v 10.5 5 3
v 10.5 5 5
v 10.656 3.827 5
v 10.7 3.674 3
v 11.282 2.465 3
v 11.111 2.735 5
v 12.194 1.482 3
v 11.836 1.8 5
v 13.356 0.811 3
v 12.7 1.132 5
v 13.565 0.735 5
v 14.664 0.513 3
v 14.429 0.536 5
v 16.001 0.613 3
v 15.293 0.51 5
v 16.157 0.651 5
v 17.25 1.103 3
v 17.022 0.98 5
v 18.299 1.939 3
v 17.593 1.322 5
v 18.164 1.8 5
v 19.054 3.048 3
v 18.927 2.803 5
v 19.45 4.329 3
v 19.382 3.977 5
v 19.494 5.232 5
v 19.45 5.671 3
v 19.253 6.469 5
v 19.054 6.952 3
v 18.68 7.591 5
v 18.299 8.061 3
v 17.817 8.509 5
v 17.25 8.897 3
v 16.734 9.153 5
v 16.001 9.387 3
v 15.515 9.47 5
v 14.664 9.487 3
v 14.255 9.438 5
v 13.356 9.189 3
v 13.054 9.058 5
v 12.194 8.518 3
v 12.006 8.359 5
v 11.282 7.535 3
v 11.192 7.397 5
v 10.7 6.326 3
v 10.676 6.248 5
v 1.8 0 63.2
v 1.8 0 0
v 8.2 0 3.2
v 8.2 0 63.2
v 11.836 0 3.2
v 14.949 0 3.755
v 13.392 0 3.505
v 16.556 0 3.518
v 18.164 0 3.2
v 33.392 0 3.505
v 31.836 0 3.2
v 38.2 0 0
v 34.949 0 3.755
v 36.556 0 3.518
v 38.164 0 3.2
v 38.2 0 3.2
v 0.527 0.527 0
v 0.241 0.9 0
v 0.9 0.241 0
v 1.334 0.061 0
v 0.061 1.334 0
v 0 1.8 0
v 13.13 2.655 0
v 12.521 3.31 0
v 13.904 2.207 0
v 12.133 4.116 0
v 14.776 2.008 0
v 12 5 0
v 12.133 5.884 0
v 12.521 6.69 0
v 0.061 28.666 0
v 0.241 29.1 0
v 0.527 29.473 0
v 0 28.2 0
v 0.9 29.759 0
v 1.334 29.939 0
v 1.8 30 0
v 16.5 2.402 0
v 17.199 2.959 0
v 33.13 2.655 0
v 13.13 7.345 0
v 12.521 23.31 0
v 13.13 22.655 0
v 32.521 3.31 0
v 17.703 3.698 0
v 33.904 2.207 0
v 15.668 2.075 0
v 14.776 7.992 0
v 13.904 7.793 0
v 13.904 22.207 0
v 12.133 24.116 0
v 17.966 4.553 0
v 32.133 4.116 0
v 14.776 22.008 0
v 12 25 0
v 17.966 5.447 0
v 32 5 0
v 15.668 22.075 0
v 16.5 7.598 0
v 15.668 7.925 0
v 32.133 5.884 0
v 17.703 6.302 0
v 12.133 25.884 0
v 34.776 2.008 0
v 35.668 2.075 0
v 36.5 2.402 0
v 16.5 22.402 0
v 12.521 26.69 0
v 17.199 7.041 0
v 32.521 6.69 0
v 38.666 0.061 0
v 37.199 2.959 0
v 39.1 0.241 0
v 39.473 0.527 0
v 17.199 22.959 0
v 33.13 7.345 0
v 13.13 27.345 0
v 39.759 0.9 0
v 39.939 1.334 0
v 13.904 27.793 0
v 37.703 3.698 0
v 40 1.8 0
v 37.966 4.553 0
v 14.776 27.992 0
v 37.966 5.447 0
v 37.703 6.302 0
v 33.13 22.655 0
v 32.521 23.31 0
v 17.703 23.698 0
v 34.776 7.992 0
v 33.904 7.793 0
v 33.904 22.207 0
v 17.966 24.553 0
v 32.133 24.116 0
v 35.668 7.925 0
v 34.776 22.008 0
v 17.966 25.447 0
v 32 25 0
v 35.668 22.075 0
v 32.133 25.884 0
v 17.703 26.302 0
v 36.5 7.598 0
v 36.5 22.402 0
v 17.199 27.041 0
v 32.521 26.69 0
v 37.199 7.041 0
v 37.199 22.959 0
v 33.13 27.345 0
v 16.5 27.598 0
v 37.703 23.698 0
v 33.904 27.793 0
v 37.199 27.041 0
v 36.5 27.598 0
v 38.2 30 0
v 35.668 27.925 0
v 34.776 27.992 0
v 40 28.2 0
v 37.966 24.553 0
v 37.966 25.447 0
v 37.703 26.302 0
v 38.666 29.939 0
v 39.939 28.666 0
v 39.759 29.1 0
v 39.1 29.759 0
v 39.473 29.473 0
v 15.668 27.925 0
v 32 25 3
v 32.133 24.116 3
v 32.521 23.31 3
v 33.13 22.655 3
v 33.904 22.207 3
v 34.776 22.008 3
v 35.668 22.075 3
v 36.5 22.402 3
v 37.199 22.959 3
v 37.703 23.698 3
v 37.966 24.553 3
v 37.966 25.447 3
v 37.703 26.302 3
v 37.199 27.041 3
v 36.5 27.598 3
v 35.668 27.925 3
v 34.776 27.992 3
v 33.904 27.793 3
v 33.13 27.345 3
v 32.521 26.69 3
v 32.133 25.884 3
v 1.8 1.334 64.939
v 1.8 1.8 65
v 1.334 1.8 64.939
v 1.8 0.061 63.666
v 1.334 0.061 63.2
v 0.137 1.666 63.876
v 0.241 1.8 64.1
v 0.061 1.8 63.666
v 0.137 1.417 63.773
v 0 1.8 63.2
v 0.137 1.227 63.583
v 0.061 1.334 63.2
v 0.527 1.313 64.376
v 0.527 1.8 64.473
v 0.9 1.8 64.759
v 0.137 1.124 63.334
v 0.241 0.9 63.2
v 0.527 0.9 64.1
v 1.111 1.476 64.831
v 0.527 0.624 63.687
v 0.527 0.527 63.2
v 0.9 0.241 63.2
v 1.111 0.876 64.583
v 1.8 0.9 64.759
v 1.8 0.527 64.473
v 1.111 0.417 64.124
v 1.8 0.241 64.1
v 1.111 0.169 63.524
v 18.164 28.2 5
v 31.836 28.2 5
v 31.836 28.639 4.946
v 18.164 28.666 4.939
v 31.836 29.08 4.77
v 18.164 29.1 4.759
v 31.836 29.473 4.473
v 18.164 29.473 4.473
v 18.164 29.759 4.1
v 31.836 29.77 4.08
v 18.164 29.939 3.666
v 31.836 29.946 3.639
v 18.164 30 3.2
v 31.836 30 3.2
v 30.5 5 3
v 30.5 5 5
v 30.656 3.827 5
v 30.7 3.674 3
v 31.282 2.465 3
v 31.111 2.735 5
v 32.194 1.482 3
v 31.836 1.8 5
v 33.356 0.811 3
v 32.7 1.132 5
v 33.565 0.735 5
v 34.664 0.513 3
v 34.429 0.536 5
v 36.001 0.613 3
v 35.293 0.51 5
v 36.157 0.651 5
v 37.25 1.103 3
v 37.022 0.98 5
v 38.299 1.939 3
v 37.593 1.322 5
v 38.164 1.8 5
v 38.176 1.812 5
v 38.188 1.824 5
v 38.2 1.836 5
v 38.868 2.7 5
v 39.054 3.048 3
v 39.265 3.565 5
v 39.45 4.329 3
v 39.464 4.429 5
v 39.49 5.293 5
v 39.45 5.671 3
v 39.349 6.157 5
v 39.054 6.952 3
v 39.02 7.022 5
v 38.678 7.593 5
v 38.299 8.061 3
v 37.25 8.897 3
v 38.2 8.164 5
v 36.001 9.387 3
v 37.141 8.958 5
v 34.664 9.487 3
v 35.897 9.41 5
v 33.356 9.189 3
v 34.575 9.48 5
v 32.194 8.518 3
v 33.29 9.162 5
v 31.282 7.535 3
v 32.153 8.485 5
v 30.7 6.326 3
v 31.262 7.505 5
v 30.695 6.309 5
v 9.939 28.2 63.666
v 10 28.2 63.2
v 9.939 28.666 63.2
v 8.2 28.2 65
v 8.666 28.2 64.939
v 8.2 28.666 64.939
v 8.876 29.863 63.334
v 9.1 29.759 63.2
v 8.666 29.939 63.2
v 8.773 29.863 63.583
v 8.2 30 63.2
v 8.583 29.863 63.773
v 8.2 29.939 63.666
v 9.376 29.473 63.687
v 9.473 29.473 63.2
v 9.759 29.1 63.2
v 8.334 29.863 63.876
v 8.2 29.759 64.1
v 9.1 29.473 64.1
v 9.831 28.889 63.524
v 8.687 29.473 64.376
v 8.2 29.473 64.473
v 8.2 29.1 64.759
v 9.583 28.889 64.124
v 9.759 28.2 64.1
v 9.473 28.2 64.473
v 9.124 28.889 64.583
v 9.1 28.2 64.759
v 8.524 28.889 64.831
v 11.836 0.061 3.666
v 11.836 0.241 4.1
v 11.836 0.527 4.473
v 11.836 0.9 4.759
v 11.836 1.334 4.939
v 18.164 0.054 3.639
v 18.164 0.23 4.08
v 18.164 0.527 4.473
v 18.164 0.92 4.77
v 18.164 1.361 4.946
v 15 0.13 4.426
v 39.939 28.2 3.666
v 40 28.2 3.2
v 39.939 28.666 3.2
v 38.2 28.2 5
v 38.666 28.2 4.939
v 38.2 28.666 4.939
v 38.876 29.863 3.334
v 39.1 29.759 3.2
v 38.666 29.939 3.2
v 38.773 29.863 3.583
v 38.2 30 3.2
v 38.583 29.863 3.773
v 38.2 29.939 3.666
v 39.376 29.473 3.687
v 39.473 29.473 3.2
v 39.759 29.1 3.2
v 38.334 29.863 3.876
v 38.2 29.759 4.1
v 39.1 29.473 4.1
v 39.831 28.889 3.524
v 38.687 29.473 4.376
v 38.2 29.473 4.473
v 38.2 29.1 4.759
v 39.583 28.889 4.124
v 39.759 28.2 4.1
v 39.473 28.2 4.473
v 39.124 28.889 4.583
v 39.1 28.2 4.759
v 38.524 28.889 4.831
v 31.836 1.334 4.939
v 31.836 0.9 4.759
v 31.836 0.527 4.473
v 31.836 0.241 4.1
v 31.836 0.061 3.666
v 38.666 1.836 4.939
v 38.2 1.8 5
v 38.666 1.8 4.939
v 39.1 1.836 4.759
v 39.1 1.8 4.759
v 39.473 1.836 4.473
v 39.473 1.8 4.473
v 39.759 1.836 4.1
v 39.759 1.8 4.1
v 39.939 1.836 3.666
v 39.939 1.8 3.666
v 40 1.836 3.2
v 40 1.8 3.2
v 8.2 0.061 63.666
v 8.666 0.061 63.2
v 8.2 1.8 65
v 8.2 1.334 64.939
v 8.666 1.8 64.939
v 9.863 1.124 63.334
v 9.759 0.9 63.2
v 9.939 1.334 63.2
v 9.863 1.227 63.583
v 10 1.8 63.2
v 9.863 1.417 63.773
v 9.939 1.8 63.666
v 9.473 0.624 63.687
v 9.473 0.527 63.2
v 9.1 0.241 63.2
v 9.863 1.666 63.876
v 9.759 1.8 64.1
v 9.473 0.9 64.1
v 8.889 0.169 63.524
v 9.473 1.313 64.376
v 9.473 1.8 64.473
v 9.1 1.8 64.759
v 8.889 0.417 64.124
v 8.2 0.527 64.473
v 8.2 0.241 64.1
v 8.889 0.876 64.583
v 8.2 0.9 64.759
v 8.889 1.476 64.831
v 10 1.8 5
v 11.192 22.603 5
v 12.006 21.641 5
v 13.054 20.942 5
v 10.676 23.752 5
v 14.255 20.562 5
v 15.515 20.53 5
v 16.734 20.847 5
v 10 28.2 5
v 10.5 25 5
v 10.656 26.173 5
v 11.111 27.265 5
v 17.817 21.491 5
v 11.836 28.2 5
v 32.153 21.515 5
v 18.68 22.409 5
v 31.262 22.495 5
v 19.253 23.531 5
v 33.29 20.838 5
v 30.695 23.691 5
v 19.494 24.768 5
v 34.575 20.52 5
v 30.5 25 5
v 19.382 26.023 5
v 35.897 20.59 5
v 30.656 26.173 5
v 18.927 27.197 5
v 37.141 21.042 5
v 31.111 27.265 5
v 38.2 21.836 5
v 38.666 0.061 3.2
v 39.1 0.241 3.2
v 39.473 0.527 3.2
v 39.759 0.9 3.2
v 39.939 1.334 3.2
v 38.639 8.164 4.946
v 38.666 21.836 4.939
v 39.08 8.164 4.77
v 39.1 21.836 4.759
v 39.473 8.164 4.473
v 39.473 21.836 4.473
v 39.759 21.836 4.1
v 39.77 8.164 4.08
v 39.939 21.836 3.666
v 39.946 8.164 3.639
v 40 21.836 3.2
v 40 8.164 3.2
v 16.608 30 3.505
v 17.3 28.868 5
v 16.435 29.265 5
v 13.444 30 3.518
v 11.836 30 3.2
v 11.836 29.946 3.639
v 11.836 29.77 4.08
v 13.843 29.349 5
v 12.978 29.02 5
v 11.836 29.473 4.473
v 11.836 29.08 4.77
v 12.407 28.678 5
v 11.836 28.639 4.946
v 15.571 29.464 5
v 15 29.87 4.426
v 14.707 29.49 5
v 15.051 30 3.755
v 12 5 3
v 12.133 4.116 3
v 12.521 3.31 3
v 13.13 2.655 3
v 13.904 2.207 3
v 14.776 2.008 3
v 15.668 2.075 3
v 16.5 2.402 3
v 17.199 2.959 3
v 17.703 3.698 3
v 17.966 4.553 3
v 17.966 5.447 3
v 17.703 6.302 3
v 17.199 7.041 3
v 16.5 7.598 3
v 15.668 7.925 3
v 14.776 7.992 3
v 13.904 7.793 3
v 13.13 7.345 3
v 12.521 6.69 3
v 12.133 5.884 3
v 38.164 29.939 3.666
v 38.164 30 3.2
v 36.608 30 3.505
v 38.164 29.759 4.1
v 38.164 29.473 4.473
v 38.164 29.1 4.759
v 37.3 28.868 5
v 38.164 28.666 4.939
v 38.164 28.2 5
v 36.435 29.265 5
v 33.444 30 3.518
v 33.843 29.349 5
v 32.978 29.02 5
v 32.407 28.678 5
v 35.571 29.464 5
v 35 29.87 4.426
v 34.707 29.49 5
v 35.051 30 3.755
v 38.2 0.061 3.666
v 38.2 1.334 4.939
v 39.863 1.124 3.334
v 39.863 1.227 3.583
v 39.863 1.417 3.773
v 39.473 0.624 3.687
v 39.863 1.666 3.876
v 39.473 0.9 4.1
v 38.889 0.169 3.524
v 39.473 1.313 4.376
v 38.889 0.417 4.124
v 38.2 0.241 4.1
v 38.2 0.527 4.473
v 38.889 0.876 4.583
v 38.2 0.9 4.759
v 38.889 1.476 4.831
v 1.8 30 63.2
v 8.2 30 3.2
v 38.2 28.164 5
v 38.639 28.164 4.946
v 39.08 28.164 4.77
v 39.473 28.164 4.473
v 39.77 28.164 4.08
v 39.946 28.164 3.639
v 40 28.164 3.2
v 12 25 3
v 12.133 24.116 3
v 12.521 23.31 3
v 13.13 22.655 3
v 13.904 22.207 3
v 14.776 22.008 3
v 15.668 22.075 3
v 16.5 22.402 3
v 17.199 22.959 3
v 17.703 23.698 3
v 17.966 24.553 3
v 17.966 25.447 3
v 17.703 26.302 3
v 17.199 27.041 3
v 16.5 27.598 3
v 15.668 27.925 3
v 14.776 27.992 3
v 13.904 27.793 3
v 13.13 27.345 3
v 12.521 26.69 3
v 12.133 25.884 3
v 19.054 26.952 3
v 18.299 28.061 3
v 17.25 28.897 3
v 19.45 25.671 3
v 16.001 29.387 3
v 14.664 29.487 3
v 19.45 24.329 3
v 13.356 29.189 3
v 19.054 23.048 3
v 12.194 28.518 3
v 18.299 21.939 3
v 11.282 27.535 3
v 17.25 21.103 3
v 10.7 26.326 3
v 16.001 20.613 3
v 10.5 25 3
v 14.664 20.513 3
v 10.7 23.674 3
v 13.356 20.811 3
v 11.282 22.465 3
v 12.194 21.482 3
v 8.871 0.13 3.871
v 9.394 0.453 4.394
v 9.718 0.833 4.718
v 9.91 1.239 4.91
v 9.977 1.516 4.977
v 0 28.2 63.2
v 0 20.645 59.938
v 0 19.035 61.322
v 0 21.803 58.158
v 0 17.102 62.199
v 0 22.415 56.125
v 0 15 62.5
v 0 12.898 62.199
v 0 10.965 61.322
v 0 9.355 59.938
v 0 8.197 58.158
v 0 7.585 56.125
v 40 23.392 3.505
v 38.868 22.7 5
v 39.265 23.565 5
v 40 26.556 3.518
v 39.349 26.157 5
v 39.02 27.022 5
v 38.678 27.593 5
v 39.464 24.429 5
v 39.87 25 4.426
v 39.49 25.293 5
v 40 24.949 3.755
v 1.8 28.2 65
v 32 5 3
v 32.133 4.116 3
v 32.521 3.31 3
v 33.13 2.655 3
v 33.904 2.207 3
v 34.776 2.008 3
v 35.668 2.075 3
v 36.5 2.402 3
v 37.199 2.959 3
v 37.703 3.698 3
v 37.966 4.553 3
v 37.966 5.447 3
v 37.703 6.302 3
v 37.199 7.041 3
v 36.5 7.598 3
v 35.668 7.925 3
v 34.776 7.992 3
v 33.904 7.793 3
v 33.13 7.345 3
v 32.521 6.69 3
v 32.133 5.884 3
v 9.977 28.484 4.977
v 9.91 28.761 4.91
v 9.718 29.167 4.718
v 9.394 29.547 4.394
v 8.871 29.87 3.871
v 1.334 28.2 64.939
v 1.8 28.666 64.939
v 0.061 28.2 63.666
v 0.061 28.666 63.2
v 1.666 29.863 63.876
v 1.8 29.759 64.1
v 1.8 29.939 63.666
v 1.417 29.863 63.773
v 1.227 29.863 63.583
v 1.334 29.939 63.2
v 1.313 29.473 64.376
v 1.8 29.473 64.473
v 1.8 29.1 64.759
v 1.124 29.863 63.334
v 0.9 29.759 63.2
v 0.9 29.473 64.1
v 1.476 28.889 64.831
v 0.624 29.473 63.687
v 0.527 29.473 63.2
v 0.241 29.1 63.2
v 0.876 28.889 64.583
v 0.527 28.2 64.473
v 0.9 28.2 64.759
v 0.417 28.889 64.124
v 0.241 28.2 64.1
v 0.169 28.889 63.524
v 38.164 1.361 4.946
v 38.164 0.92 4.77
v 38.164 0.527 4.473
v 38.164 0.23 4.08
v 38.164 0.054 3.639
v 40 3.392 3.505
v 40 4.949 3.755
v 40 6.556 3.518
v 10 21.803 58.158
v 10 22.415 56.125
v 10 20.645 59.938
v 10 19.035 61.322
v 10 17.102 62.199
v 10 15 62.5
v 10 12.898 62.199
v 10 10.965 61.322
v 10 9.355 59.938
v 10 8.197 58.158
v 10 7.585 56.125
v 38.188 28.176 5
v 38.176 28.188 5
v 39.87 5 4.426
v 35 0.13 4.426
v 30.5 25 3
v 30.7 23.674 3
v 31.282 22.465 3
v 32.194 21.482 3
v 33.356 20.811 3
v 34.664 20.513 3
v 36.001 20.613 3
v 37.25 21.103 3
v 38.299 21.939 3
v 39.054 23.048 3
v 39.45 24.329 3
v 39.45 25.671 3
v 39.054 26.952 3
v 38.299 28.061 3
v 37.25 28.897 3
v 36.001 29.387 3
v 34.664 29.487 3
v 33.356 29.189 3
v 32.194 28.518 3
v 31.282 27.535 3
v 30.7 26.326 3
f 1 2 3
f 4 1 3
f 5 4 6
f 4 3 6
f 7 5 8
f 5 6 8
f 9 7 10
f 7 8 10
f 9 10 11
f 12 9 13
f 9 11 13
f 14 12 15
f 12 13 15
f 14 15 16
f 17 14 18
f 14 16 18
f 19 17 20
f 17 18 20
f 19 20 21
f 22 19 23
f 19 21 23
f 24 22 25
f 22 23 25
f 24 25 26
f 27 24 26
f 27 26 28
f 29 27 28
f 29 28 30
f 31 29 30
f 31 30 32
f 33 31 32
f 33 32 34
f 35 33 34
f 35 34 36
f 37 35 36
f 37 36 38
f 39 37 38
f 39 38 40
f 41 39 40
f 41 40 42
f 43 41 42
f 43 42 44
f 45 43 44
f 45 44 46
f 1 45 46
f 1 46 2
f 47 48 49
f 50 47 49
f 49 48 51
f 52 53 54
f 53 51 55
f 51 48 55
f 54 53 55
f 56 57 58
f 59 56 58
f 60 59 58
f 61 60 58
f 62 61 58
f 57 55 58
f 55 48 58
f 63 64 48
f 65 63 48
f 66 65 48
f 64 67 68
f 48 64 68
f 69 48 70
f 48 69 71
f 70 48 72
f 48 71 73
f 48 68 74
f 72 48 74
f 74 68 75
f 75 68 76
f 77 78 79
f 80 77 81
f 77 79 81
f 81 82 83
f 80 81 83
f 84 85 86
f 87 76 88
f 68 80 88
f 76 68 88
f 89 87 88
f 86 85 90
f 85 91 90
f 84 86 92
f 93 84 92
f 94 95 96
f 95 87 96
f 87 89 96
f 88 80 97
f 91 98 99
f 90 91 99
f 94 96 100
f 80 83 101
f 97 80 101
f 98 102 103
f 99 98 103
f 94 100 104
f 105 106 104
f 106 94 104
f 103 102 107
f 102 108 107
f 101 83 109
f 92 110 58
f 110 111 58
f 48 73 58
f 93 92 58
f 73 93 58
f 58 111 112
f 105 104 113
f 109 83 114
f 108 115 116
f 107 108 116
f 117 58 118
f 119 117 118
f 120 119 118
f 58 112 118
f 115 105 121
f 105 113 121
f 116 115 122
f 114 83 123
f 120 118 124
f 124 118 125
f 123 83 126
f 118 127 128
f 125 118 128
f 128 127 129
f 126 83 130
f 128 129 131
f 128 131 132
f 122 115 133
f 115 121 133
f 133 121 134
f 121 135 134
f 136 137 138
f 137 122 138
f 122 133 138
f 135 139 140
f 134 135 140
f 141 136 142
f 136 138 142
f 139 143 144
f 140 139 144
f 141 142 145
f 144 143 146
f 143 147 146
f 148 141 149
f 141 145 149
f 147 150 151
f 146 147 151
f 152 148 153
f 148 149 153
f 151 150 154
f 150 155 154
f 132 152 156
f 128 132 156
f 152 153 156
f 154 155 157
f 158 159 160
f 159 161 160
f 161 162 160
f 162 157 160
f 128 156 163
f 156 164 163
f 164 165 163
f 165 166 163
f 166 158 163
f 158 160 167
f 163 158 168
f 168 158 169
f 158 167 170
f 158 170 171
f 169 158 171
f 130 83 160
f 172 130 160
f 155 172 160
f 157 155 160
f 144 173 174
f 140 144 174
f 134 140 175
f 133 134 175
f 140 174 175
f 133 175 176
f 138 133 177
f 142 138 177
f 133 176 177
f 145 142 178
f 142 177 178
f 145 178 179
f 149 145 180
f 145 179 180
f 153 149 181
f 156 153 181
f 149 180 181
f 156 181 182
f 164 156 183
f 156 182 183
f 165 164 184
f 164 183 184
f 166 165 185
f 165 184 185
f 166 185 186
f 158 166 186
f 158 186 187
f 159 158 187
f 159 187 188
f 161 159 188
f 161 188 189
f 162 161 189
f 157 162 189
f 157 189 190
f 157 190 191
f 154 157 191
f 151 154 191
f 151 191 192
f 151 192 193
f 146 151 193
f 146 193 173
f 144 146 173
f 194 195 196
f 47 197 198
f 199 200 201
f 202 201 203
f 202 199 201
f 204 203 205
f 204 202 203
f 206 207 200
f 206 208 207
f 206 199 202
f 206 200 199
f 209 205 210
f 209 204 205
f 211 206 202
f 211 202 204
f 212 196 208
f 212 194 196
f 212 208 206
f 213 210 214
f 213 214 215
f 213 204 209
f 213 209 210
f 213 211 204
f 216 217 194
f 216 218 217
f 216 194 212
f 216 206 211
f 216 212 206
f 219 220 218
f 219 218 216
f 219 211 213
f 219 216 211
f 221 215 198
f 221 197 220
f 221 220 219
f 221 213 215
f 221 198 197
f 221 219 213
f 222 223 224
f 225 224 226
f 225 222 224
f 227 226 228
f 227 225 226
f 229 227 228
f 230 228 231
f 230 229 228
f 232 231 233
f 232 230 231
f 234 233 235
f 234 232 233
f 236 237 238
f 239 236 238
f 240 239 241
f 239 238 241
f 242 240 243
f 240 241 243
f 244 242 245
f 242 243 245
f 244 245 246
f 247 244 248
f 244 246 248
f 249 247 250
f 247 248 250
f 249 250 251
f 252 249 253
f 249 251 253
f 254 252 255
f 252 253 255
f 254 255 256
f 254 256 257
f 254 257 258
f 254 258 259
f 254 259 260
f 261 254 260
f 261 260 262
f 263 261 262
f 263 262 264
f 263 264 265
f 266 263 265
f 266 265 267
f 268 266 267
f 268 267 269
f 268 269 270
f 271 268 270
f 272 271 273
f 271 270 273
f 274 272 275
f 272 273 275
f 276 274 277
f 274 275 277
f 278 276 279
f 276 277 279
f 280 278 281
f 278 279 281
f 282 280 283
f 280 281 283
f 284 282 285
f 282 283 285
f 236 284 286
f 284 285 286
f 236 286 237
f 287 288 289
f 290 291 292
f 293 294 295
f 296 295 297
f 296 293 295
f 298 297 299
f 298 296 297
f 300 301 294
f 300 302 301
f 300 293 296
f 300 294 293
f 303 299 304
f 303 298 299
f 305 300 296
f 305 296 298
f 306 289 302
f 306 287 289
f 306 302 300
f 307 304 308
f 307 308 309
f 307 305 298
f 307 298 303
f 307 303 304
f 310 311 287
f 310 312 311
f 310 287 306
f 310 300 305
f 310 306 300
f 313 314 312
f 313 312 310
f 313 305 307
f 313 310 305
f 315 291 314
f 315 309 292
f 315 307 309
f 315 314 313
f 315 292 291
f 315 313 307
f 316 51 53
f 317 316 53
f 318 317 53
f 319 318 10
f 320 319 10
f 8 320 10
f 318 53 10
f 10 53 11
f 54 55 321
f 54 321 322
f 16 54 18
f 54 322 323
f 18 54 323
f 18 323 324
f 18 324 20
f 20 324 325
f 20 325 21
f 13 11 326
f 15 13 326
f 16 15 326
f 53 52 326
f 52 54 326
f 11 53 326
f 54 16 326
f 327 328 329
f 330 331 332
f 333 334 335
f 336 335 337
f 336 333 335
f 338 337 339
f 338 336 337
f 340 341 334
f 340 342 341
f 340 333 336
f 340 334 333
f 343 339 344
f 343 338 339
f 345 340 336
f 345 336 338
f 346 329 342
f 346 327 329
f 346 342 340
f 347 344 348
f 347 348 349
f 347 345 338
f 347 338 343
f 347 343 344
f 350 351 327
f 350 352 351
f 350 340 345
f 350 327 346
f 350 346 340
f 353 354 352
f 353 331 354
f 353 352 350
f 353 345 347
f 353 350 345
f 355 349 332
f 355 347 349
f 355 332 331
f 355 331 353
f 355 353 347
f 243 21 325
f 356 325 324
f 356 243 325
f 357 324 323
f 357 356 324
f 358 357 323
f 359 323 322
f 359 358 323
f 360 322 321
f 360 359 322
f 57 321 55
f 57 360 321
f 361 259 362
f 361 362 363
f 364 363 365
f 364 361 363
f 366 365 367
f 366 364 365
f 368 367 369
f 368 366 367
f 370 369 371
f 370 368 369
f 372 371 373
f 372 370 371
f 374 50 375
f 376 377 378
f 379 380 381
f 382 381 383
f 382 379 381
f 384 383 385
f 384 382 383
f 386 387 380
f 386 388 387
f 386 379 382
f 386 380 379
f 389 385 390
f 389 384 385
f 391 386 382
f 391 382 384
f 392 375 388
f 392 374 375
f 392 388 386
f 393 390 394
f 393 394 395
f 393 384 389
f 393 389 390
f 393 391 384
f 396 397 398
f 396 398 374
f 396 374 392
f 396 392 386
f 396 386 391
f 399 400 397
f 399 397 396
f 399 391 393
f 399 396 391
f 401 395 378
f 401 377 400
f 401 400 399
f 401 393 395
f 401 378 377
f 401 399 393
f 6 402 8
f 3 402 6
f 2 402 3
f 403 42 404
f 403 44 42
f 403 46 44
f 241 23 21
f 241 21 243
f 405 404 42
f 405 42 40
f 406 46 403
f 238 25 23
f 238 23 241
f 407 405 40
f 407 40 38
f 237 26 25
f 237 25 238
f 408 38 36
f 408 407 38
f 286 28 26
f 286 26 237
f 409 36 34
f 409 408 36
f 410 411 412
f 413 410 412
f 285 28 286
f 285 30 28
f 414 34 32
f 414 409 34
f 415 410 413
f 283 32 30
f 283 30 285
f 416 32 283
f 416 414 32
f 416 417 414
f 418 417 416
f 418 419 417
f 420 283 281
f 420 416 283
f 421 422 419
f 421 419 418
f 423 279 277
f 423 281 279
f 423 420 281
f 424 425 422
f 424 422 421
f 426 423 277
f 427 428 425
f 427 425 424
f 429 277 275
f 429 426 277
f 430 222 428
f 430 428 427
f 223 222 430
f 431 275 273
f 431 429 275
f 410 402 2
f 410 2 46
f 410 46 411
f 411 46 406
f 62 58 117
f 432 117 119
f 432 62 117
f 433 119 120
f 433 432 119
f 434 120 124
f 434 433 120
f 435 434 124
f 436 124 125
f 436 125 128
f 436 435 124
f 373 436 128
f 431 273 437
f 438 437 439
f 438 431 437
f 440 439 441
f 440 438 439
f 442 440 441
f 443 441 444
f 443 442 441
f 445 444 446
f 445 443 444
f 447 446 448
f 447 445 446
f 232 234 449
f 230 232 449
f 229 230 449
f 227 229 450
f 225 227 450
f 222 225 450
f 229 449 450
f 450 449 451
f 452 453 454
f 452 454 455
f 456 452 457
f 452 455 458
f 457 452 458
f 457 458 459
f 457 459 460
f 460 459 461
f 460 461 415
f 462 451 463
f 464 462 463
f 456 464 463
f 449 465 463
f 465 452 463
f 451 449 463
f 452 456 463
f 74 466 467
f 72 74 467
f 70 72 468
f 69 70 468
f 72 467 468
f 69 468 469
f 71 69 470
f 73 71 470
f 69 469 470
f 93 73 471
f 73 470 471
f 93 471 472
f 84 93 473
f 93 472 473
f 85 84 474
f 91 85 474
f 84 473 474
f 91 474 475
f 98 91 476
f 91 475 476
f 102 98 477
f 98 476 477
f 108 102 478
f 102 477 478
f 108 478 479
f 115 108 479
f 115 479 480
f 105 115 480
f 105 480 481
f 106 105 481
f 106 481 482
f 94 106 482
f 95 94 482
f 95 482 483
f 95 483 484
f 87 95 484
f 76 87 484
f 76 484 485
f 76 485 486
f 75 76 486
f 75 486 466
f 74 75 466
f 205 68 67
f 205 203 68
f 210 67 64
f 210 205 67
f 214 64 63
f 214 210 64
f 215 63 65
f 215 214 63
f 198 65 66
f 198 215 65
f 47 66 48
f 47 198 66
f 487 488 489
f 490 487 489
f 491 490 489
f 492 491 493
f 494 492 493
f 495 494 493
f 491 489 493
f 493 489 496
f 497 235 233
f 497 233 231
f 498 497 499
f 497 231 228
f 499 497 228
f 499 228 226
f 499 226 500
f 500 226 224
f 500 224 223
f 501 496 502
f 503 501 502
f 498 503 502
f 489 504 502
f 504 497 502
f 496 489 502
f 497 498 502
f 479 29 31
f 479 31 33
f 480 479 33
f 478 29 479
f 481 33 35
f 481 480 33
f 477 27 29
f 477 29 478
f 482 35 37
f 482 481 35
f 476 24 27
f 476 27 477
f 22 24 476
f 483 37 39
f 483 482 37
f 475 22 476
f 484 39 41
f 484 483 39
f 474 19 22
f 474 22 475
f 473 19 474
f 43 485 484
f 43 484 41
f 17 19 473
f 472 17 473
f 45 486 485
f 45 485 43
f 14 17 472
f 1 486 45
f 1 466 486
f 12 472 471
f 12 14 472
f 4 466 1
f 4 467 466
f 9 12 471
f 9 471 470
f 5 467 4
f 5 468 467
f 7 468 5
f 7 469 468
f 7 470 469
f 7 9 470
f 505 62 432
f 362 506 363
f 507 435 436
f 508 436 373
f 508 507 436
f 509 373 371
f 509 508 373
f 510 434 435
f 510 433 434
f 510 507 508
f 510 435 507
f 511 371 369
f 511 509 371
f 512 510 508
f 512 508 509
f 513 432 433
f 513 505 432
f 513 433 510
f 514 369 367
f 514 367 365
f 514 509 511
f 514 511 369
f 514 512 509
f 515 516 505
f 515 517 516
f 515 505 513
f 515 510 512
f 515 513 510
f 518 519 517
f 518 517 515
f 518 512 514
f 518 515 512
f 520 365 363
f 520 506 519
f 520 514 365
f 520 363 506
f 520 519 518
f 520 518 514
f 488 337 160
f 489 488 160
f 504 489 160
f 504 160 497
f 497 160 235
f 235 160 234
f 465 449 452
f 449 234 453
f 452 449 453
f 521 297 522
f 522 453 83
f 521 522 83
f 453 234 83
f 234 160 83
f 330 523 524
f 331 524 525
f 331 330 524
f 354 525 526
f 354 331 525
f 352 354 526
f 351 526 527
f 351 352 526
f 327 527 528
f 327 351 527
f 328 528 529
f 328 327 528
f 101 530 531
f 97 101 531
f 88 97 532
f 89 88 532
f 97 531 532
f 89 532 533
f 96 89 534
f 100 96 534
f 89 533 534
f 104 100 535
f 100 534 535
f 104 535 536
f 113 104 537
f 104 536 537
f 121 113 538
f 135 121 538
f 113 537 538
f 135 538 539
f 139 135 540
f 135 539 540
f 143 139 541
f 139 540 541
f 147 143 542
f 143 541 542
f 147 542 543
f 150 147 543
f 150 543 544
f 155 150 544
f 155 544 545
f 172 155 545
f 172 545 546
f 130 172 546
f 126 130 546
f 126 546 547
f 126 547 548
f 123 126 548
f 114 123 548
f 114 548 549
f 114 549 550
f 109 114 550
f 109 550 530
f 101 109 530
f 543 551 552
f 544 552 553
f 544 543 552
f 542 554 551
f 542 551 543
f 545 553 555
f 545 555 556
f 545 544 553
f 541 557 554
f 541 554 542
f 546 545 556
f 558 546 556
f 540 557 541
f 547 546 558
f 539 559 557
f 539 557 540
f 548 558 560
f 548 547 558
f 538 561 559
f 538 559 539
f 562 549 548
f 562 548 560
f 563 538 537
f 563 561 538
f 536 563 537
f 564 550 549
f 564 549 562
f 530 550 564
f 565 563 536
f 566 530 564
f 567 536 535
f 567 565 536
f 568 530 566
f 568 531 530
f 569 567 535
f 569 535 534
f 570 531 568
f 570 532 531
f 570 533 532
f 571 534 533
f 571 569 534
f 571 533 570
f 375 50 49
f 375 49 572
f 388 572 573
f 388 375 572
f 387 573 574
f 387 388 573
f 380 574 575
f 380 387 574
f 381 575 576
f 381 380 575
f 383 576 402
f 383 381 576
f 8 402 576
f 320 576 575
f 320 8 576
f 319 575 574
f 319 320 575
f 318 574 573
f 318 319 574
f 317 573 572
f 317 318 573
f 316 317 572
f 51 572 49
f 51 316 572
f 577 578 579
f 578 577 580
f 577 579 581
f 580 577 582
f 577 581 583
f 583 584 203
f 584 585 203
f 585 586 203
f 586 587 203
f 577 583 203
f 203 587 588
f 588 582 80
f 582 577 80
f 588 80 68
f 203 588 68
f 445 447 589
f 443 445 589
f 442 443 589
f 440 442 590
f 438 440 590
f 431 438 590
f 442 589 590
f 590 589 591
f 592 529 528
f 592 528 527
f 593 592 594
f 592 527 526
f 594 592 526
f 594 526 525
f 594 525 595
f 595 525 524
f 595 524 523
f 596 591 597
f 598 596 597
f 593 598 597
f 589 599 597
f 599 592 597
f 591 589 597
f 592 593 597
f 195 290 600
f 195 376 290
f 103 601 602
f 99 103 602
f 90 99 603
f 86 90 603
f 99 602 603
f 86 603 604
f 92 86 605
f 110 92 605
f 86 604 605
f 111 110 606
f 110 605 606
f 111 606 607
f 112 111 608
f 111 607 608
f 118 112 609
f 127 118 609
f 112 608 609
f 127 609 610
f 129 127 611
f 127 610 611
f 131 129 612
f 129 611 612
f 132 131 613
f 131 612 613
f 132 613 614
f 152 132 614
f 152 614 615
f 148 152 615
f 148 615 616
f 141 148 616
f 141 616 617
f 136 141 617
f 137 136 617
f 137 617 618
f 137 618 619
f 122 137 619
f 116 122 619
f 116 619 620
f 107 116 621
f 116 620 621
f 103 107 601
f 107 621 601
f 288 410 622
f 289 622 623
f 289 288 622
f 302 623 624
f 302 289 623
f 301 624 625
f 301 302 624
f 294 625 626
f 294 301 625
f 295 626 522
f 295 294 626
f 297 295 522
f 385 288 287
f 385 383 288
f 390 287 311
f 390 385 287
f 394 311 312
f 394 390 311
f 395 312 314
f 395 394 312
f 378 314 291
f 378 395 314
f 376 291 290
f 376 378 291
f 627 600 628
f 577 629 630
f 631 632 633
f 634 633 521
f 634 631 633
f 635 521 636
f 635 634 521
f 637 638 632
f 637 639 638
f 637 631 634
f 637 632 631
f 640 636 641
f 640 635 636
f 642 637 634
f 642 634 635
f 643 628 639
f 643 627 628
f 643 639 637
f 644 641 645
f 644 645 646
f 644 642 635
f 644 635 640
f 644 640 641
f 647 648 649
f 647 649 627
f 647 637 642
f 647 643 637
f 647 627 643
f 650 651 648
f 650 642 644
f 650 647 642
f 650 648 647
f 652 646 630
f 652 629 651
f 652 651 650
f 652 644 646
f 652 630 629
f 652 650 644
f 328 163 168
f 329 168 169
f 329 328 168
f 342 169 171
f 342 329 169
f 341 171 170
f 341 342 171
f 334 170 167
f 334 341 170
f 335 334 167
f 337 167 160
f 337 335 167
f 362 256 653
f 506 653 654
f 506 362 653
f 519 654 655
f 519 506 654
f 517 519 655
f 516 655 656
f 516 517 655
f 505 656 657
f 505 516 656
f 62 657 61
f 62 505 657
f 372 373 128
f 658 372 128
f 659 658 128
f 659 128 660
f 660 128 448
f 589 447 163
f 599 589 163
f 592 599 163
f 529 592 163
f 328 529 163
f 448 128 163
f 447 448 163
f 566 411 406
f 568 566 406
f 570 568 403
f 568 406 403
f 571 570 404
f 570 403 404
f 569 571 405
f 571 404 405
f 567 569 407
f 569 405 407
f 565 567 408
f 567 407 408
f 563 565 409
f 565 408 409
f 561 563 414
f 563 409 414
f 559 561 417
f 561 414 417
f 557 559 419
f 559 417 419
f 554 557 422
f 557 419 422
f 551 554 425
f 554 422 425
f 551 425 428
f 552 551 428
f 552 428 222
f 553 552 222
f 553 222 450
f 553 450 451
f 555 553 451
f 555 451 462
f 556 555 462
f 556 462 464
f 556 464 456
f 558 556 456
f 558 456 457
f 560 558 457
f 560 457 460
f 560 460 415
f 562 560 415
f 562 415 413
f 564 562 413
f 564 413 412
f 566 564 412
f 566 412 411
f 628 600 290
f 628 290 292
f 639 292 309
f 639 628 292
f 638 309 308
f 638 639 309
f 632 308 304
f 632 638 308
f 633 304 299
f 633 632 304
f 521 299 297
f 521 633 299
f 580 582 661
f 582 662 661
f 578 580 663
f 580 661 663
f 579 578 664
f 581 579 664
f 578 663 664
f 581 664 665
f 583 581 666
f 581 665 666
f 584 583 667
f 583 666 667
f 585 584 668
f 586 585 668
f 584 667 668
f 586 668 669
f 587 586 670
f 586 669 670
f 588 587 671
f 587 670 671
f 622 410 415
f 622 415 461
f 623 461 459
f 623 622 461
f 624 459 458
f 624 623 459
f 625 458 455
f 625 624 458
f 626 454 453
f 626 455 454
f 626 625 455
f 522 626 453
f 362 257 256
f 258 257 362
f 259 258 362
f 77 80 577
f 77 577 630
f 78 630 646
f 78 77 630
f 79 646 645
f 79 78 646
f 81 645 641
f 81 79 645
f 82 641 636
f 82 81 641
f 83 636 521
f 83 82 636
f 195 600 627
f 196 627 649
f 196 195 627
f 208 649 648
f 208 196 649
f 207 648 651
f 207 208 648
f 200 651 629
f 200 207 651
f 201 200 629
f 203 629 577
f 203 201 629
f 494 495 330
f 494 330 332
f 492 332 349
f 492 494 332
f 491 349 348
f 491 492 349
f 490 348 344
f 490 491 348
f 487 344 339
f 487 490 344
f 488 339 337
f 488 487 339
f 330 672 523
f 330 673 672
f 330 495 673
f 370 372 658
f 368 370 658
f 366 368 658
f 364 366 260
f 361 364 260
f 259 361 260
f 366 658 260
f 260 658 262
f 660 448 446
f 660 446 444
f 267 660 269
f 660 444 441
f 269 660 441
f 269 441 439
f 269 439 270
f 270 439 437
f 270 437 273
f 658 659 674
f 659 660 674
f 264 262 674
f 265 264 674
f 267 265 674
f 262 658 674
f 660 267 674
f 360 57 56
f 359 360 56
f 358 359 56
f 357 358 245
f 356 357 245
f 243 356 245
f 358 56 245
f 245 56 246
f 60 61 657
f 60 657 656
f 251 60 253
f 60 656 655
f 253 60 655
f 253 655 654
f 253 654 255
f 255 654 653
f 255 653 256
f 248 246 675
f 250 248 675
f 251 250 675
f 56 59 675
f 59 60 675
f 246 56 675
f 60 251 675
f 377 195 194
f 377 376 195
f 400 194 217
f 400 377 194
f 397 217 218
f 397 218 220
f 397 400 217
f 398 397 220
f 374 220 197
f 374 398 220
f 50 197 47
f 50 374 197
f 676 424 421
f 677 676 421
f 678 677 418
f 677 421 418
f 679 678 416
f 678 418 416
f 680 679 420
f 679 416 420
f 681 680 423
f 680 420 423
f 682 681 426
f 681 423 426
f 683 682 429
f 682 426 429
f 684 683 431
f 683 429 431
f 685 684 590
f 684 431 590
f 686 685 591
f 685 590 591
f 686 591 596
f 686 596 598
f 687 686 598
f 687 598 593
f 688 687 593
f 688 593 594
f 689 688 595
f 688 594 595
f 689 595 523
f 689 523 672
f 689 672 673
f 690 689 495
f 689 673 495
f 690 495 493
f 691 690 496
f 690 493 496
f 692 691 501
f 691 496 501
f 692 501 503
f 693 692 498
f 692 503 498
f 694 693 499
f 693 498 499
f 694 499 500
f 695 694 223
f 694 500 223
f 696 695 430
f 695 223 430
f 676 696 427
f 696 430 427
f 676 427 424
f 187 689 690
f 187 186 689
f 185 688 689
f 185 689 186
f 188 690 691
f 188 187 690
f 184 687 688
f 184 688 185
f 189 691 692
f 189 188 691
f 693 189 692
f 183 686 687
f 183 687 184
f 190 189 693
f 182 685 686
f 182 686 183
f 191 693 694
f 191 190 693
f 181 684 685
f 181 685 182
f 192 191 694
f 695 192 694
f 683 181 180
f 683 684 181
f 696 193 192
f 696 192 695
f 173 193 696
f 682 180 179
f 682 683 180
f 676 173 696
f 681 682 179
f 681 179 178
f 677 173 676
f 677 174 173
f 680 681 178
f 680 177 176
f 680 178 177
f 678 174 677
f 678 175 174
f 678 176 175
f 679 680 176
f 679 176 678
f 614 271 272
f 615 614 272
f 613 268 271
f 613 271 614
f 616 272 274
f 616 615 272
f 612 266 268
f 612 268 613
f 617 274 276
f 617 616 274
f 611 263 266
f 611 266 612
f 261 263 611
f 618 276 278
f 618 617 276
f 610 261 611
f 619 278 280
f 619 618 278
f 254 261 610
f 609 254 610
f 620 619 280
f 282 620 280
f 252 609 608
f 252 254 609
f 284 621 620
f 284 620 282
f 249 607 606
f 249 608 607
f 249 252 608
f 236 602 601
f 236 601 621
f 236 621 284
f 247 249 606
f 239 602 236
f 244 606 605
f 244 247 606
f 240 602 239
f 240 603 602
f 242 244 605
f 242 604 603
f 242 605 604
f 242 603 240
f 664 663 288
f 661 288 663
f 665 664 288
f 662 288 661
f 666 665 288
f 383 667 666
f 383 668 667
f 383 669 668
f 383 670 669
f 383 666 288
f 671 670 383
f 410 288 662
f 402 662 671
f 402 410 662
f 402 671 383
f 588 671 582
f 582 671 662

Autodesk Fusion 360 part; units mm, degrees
sketch "Sketch1" plane through (0, 0, 0) normal (0, 0, 1) x (1, 0, 0)
  line L0 (0, 0) -> (40, 0)
  line L1 (40, 0) -> (40, 30)
  line L2 (40, 30) -> (0, 30)
  line L3 (0, 30) -> (0, 0)
  dimension "d1" = 40
  dimension "d2" = 30
extrude "Extrude1" add sketch "Sketch1" along normal blind 5
sketch "Sketch2" plane through (0, 0, 5) normal (0, 0, 1) x (-1, 0, 0)
  line L0 (0, -30) -> (0, 0)
  line L1 (0, 0) -> (-40, 0)
  line L2 (-40, 0) -> (-40, -30)
  line L3 (-40, -30) -> (0, -30)
  line L4 (0, -30) -> (-10, -30)
  line L5 (-10, -30) -> (-10, 0)
  line L6 (-10, 0) -> (0, 0)
  line L7 (0, 0) -> (0, -30)
  dimension "d5" = 10
  dimension "d6" = 30
extrude "Extrude2" add sketch "Sketch2" along normal blind 60 contours L0 L1 L3 L4 L5 L6 L7
sketch "Sketch3" plane through (10, 0, 0) normal (1, 0, 0) x (0, 1, 0)
  line L0 (0, 5) -> (30, 5)
  line L1 (30, 5) -> (30, 65)
  line L2 (30, 65) -> (0, 65)
  line L3 (0, 65) -> (0, 5)
  circle A0 centre (15, 55) radius 7.5
  circle A1 centre (15, 57) radius 7.5
  line L4 (22.5, 55.875) -> (7.5, 55.875)
  line L5 (7.5, 55.875) -> (7.5, 56.125)
  line L6 (7.5, 56.125) -> (22.5, 56.125)
  line L7 (22.5, 56.125) -> (22.5, 55.875)
  line L8 (22.5, 55.875) -> (7.5, 56.125) construction
  line L9 (7.5, 55.875) -> (22.5, 56.125) construction
  point P0 (15, 56)
  dimension "d9" = 15
  dimension "d10" = 15
  dimension "d11" = 15
  dimension "d12" = 0.25
extrude "Extrude3" cut sketch "Sketch3" against normal blind 10 contours A0 L6
sketch "Sketch4" plane through (0, 0, 5) normal (0, 0, 1) x (-1, 0, 0)
  line L0 (-10, -30) -> (-10, 0)
  line L1 (-10, 0) -> (-40, 0)
  line L2 (-40, 0) -> (-40, -30)
  line L3 (-40, -30) -> (-10, -30)
  circle A0 centre (-15, -25) radius 3
  circle A1 centre (-35, -25) radius 3
  circle A2 centre (-15, -5) radius 3
  circle A3 centre (-35, -5) radius 3
  dimension "d17" = 6
  dimension "d18" = 6
  dimension "d19" = 6
  dimension "d20" = 6
extrude "Extrude4" cut sketch "Sketch4" against normal blind 5 contours A0 | A1 | A2 | A3
sketch "Sketch5" plane through (0, 0, 5) normal (0, 0, 1) x (-1, 0, 0)
  circle A0 centre (-15, -25) radius 3
  circle A1 centre (-35, -25) radius 3
  circle A2 centre (-15, -5) radius 3
  circle A3 centre (-35, -5) radius 3
  line L0 (-10, -30) -> (-10, 0)
  line L1 (-10, 0) -> (-40, 0)
  line L2 (-40, 0) -> (-40, -30)
  line L3 (-40, -30) -> (-10, -30)
  circle A4 centre (-15, -5) radius 4.5
  circle A5 centre (-15, -25) radius 4.5
  circle A6 centre (-35, -25) radius 4.5
  circle A7 centre (-35, -5) radius 4.5
  dimension "d23" = 9
  dimension "d24" = 9
  dimension "d25" = 9
  dimension "d26" = 9
extrude "Extrude5" cut sketch "Sketch5" against normal blind 2 contours A4 | A5 | A6 | A7
fillet "Fillet1" radius 1.8 13 edges at (5, 0, 65) (0, 15, 65) (10, 15, 65) (10, 0, 35) (0, 0, 32.5) (25, 0, 5) (40, 0, 2.5) (40, 15, 5) (40, 30, 2.5) (25, 30, 5) (10, 30, 35) (0, 30, 32.5) (5, 30, 65)
